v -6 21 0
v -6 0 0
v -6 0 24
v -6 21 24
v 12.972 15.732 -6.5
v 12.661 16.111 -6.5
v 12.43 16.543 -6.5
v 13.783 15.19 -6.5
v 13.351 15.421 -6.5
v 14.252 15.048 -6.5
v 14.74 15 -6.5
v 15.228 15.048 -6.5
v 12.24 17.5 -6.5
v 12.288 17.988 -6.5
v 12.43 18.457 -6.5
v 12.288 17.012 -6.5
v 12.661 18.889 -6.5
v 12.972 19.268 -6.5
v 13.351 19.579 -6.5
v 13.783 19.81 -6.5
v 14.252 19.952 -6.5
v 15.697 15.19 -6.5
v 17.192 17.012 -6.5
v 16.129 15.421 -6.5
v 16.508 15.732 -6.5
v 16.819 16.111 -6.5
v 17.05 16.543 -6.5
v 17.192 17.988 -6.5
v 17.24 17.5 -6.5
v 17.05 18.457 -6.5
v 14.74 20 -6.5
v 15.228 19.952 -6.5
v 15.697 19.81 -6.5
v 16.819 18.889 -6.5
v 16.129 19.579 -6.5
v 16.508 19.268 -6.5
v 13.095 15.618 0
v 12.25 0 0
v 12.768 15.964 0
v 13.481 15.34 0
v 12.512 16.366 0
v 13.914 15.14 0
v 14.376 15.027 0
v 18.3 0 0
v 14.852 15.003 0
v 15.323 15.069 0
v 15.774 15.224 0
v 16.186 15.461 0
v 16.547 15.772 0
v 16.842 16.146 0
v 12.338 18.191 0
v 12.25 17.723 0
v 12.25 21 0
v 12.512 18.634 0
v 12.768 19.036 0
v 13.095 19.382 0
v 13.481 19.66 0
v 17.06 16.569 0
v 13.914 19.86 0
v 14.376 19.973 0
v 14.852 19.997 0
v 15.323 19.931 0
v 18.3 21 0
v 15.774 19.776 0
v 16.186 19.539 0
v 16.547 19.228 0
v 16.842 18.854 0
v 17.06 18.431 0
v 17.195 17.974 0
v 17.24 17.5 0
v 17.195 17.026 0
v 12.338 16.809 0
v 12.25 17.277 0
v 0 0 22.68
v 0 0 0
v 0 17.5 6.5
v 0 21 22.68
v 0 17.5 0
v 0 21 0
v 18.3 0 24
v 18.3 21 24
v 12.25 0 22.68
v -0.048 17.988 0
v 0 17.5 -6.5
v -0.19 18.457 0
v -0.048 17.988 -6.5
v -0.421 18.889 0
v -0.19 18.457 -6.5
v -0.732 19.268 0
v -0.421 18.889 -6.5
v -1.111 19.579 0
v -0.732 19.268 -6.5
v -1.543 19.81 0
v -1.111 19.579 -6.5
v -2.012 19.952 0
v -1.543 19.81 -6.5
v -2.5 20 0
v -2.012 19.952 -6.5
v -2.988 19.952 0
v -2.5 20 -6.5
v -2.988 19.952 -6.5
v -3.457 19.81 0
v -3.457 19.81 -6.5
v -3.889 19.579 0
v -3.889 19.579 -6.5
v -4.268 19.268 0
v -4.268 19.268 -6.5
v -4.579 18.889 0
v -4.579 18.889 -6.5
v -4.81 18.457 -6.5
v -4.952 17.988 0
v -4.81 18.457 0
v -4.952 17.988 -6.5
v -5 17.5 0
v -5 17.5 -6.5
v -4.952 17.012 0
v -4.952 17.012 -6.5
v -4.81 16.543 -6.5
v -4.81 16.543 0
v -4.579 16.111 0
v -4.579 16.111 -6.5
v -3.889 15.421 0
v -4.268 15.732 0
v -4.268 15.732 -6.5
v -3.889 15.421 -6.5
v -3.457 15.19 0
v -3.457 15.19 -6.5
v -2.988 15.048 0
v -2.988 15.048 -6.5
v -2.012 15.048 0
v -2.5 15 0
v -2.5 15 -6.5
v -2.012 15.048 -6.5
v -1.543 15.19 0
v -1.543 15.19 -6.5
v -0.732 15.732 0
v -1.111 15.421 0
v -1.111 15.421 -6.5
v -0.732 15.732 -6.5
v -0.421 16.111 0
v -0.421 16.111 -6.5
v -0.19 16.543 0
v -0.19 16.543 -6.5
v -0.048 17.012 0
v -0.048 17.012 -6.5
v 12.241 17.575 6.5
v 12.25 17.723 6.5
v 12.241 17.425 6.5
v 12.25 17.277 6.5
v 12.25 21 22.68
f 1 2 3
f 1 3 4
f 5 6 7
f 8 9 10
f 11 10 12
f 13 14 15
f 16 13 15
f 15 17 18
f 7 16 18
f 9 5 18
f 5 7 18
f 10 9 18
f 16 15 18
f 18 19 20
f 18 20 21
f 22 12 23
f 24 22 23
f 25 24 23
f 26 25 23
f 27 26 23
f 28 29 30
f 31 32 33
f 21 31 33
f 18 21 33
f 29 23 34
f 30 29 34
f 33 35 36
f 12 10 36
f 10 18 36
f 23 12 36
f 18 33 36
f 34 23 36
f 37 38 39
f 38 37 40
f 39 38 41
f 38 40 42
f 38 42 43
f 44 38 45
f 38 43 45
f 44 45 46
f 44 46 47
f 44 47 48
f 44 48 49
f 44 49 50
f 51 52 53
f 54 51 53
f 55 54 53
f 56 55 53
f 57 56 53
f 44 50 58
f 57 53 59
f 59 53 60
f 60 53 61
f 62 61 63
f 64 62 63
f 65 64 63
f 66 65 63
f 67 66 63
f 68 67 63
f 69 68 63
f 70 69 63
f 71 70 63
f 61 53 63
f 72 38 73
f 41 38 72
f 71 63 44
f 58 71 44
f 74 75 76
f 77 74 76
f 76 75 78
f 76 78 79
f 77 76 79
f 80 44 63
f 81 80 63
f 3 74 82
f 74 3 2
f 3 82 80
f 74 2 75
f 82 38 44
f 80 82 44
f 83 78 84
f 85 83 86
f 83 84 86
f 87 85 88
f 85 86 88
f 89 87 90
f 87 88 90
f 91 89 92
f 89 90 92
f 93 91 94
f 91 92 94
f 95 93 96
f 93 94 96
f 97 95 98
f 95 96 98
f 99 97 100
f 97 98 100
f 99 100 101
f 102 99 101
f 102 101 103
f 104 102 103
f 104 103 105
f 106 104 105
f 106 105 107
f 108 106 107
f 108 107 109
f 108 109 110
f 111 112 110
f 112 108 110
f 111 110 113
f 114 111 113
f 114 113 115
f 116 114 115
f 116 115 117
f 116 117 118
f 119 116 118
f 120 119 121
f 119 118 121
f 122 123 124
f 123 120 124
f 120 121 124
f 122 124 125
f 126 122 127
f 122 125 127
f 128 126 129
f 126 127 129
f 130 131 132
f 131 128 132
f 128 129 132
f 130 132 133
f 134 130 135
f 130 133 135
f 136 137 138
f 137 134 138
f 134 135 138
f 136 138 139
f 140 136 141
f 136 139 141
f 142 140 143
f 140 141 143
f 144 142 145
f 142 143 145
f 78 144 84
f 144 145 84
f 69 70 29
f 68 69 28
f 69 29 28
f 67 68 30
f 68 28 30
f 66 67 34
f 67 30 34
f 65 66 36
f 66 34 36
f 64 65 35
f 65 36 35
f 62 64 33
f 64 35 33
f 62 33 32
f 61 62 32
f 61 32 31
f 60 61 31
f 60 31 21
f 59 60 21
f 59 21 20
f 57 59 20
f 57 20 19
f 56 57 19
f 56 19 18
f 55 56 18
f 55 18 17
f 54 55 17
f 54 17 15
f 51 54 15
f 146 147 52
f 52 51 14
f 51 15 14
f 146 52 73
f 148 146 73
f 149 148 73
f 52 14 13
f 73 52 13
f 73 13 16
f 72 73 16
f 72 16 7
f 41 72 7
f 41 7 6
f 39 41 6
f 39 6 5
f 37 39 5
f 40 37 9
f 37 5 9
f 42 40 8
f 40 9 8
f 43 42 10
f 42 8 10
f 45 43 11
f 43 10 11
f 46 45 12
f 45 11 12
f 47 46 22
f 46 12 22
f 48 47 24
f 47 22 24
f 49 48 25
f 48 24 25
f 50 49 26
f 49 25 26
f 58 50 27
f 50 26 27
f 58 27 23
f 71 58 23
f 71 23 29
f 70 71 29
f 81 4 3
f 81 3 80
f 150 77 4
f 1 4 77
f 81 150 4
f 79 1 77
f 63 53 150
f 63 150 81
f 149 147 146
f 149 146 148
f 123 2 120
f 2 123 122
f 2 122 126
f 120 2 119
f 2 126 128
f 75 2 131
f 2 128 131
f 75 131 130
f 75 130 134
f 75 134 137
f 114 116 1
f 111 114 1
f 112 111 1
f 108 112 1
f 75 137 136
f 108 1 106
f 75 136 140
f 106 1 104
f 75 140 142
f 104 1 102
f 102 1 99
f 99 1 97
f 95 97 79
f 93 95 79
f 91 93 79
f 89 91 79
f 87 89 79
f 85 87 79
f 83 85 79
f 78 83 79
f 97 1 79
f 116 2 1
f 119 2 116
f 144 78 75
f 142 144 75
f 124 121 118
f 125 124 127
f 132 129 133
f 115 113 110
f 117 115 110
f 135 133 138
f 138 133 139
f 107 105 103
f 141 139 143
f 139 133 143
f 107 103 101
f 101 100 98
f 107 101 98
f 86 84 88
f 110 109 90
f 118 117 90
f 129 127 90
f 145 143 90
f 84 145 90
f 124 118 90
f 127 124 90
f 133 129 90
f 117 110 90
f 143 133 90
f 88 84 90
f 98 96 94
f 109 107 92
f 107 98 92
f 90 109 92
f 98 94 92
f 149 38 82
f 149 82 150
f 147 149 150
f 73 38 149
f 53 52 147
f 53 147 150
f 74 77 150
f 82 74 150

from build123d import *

# Parameters (mm, degrees)
CYLINDER001_R     = 2.5
CYLINDER001_DEPTH = 13
BOX_W             = 12.25
BOX_H             = 23.78
BOX_DEPTH         = 22.68
BOX002_W          = 24.3
BOX002_H          = 21
BOX002_DEPTH      = 24
CYLINDER_R        = 2.5
CYLINDER_DEPTH    = 13


with BuildPart() as cylinder001:
    # Cylinder001 → Cylinder001 (new body)
    with BuildSketch(Plane(origin=(14.74, 17.5, -6.5), x_dir=(1, 0, 0), z_dir=(0, 0, 1))):
        Circle(CYLINDER001_R)
    extrude(amount=CYLINDER001_DEPTH)


with BuildPart() as servo:
    # Box → Box (new body)
    with BuildSketch(Plane(origin=(0, -1, 0), x_dir=(1, 0, 0), z_dir=(0, 0, 1))):
        with Locations((6.125, 11.89)):
            Rectangle(BOX_W, BOX_H)
    extrude(amount=BOX_DEPTH)


with BuildPart() as cut:
    # Box002 → Box002 (new body)
    with BuildSketch(Plane(origin=(-6, 0, 0), x_dir=(1, 0, 0), z_dir=(0, 0, 1))):
        with Locations((12.15, 10.5)):
            Rectangle(BOX002_W, BOX002_H)
    extrude(amount=BOX002_DEPTH)

    # Cut: cut servo
    add(servo.part, mode=Mode.SUBTRACT)


with BuildPart() as fusion:
    # Cylinder → Cylinder (new body)
    with BuildSketch(Plane(origin=(-2.5, 17.5, -6.5), x_dir=(1, 0, 0), z_dir=(0, 0, 1))):
        Circle(CYLINDER_R)
    extrude(amount=CYLINDER_DEPTH)

    # Fusion: union Cylinder001, Cut
    add(cylinder001.part)
    add(cut.part)


solid = fusion.part
